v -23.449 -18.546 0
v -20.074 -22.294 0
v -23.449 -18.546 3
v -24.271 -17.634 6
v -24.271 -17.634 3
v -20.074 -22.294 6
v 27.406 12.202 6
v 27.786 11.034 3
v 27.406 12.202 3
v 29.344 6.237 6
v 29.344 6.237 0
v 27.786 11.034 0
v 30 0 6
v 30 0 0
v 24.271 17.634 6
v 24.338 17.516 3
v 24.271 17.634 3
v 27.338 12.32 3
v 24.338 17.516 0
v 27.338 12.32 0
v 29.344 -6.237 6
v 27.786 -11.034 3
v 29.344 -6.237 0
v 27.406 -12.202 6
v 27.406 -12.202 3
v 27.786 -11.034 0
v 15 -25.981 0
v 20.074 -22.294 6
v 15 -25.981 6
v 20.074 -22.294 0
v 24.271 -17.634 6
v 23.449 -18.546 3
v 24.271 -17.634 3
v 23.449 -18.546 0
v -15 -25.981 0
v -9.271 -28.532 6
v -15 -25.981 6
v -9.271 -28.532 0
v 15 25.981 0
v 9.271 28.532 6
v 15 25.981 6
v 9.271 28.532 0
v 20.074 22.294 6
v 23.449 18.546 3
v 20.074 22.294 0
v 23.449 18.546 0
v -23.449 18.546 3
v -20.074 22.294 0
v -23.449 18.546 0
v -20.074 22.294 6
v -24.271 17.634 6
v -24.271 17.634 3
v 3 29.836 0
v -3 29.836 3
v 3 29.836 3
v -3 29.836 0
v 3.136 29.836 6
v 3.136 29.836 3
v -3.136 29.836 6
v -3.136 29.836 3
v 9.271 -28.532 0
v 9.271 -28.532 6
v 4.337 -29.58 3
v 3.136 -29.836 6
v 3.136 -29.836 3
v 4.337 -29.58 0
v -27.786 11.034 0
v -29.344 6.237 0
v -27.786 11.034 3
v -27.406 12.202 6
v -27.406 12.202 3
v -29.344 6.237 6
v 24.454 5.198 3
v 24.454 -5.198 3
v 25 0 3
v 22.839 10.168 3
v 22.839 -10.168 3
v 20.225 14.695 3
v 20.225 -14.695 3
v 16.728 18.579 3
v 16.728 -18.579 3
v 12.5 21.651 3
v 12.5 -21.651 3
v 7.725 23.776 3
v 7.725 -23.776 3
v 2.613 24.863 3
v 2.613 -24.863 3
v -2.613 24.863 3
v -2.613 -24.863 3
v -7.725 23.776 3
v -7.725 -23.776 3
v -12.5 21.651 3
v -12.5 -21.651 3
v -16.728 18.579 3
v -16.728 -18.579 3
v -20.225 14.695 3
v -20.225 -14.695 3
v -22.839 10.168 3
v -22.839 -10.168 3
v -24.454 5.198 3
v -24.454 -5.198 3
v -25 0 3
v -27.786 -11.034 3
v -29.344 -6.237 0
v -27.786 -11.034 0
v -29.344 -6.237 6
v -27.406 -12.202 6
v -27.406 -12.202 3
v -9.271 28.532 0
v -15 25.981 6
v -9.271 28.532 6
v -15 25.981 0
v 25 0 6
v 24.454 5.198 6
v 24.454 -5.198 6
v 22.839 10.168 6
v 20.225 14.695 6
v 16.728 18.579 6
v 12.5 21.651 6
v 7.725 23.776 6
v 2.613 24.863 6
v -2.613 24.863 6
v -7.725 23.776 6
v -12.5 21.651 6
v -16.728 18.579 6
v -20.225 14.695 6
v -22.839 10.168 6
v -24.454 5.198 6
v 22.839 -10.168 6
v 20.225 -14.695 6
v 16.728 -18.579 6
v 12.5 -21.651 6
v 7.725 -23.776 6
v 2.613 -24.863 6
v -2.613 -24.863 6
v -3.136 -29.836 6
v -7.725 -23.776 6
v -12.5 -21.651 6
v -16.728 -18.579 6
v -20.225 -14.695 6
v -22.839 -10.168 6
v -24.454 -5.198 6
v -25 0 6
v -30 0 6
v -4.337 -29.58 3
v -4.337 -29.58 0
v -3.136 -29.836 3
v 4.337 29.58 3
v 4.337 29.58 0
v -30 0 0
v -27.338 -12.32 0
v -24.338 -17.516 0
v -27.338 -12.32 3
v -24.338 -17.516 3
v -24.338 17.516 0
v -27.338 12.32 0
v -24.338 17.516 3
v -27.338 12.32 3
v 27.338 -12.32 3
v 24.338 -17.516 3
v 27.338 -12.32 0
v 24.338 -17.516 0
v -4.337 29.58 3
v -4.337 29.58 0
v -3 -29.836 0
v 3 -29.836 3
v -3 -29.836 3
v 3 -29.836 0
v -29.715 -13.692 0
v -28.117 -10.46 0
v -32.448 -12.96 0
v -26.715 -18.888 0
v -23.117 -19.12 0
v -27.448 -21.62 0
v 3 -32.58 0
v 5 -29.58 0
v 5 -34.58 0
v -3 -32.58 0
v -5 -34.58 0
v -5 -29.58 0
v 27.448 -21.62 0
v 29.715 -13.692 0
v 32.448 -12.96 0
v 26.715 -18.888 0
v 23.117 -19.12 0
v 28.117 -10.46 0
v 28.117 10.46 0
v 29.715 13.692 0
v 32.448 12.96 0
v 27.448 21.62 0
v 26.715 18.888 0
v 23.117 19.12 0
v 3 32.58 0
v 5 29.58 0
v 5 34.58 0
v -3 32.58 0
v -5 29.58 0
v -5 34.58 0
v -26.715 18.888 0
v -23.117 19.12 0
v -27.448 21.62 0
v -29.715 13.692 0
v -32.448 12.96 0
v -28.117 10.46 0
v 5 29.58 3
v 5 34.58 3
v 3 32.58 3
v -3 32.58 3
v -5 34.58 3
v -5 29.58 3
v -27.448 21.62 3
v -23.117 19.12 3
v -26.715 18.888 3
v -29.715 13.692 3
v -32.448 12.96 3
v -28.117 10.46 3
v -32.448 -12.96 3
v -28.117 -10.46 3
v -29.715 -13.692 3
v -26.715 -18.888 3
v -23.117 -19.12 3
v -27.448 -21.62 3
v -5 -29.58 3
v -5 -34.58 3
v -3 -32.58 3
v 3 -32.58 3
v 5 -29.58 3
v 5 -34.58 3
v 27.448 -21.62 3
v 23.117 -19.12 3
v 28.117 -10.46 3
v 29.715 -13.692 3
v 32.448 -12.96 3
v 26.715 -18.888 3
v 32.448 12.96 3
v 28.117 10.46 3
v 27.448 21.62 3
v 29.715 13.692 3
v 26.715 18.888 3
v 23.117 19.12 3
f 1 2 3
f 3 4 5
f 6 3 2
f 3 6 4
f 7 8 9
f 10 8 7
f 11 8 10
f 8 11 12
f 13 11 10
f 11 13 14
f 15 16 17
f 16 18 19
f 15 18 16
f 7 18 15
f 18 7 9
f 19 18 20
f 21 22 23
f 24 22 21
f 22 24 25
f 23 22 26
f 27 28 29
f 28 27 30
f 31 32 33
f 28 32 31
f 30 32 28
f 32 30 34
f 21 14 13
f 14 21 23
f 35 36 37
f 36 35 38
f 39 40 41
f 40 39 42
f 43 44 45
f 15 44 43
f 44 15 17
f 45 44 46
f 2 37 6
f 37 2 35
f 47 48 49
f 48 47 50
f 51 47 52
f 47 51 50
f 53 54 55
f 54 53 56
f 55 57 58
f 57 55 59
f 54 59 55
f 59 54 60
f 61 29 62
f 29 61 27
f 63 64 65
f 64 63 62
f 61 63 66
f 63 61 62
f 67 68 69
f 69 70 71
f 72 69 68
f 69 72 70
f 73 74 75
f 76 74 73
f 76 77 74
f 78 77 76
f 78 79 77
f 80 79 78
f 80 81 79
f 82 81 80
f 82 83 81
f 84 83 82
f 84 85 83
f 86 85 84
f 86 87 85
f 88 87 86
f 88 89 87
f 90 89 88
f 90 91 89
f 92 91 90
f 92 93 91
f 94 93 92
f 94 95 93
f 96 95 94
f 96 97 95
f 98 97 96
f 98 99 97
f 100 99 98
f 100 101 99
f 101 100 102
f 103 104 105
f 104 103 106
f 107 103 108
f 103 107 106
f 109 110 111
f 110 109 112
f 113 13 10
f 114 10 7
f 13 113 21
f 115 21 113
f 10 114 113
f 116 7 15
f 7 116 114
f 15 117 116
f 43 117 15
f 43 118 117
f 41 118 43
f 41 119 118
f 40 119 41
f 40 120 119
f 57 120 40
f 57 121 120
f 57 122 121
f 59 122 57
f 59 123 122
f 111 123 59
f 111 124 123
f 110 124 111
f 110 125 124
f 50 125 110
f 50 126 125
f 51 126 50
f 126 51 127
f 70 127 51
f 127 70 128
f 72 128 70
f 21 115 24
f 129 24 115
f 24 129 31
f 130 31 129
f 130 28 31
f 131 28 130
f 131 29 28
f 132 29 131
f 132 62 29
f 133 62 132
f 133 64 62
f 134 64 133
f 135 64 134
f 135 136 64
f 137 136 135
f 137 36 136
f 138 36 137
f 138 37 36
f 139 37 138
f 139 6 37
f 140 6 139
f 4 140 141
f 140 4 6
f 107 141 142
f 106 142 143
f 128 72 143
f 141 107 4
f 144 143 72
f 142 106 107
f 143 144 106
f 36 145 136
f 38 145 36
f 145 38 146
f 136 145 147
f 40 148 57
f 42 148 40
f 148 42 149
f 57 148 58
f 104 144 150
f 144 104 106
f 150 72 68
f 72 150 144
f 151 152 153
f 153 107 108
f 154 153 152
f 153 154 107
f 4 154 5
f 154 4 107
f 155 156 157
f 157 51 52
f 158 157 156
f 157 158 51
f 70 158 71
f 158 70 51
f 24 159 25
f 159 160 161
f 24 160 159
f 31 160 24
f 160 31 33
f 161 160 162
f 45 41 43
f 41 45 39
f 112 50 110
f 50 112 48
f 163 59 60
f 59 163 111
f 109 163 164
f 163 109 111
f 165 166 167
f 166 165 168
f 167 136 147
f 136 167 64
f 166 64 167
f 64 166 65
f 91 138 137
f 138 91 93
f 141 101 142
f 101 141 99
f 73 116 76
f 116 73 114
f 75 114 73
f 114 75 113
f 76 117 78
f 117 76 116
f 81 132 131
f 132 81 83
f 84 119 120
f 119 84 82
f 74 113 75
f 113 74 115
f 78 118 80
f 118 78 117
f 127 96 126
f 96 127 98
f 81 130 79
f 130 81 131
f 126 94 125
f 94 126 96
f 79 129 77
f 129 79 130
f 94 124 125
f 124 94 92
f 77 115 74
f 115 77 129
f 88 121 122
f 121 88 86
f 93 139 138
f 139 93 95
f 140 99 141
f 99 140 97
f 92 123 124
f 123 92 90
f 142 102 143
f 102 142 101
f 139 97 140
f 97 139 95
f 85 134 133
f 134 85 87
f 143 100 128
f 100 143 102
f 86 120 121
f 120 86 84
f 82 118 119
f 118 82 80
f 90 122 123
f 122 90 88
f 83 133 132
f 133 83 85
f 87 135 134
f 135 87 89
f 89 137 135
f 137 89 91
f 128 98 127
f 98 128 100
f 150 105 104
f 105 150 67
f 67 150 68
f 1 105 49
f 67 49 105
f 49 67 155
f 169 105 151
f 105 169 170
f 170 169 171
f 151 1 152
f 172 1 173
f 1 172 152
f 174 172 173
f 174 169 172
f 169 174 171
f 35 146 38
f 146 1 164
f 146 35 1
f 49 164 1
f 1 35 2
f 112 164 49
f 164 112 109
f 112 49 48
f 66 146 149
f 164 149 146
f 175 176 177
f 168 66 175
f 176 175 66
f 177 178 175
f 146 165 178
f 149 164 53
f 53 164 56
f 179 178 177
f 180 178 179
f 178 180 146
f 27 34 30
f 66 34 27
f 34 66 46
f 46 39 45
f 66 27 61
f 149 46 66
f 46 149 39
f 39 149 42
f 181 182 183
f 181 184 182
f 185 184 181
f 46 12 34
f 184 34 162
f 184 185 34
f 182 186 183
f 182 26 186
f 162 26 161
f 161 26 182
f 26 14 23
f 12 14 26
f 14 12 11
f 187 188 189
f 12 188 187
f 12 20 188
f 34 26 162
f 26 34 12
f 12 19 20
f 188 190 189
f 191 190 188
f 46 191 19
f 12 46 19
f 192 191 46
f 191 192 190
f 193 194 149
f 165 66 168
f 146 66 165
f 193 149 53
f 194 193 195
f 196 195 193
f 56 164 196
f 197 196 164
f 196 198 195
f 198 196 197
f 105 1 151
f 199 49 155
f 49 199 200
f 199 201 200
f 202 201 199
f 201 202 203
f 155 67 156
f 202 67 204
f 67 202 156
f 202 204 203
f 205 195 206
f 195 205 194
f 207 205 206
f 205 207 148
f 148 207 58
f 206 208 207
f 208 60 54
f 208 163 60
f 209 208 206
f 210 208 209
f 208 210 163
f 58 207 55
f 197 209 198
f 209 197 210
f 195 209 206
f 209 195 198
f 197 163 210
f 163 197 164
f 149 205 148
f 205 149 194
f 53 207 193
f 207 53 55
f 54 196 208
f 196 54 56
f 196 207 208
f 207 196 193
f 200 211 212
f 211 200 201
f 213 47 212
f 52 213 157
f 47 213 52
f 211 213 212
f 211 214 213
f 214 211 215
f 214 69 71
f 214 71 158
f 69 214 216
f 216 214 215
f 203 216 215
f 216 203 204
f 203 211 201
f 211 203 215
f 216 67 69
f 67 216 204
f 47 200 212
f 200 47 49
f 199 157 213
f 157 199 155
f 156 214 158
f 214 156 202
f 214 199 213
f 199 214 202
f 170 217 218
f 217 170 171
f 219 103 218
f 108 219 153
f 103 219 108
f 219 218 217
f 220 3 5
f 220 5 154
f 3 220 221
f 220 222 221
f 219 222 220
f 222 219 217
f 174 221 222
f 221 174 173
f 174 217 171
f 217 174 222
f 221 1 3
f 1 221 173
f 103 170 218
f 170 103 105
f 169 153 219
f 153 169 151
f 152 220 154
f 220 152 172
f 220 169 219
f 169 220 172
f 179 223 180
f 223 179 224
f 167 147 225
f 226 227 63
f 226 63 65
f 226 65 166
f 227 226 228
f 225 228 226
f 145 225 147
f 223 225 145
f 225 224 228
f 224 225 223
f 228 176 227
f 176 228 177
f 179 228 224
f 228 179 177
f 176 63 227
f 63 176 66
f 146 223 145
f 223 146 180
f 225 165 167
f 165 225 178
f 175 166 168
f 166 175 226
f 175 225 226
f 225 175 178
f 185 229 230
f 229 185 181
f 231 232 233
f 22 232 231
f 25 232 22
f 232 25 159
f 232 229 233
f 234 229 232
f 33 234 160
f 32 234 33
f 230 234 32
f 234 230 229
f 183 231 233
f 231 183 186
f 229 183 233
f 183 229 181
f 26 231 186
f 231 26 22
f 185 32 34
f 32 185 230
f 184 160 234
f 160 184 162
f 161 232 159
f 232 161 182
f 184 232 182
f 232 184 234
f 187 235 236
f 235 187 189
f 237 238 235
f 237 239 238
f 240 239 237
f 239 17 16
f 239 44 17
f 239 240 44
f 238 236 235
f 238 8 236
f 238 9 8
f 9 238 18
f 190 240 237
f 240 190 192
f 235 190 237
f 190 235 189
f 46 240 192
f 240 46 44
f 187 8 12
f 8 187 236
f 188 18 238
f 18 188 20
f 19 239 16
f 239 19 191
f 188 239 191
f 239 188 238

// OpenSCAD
union() {
	union() {
		cylinder(h = 3, r = 30);
		translate(v = [0, 0, 3]) {
			difference() {
				cylinder(h = 3, r = 30);
				cylinder(h = 3, r = 25);
			}
		}
	}
	union() {
		union() {
			union() {
				union() {
					union() {
						translate(v = [0, 29.5803989155, 0]) {
							translate(v = [-5.0000000000, 0, 0]) {
								difference() {
									cube(size = [10, 5, 3]);
									translate(v = [2.0000000000, 0, 0]) {
										cube(size = [6, 3, 10]);
									}
								}
							}
						}
						rotate(a = [0, 0, 60.0000000000]) {
							translate(v = [0, 29.5803989155, 0]) {
								translate(v = [-5.0000000000, 0, 0]) {
									difference() {
										cube(size = [10, 5, 3]);
										translate(v = [2.0000000000, 0, 0]) {
											cube(size = [6, 3, 10]);
										}
									}
								}
							}
						}
					}
					rotate(a = [0, 0, 120.0000000000]) {
						translate(v = [0, 29.5803989155, 0]) {
							translate(v = [-5.0000000000, 0, 0]) {
								difference() {
									cube(size = [10, 5, 3]);
									translate(v = [2.0000000000, 0, 0]) {
										cube(size = [6, 3, 10]);
									}
								}
							}
						}
					}
				}
				rotate(a = [0, 0, 180.0000000000]) {
					translate(v = [0, 29.5803989155, 0]) {
						translate(v = [-5.0000000000, 0, 0]) {
							difference() {
								cube(size = [10, 5, 3]);
								translate(v = [2.0000000000, 0, 0]) {
									cube(size = [6, 3, 10]);
								}
							}
						}
					}
				}
			}
			rotate(a = [0, 0, 240.0000000000]) {
				translate(v = [0, 29.5803989155, 0]) {
					translate(v = [-5.0000000000, 0, 0]) {
						difference() {
							cube(size = [10, 5, 3]);
							translate(v = [2.0000000000, 0, 0]) {
								cube(size = [6, 3, 10]);
							}
						}
					}
				}
			}
		}
		rotate(a = [0, 0, 300.0000000000]) {
			translate(v = [0, 29.5803989155, 0]) {
				translate(v = [-5.0000000000, 0, 0]) {
					difference() {
						cube(size = [10, 5, 3]);
						translate(v = [2.0000000000, 0, 0]) {
							cube(size = [6, 3, 10]);
						}
					}
				}
			}
		}
	}
}
